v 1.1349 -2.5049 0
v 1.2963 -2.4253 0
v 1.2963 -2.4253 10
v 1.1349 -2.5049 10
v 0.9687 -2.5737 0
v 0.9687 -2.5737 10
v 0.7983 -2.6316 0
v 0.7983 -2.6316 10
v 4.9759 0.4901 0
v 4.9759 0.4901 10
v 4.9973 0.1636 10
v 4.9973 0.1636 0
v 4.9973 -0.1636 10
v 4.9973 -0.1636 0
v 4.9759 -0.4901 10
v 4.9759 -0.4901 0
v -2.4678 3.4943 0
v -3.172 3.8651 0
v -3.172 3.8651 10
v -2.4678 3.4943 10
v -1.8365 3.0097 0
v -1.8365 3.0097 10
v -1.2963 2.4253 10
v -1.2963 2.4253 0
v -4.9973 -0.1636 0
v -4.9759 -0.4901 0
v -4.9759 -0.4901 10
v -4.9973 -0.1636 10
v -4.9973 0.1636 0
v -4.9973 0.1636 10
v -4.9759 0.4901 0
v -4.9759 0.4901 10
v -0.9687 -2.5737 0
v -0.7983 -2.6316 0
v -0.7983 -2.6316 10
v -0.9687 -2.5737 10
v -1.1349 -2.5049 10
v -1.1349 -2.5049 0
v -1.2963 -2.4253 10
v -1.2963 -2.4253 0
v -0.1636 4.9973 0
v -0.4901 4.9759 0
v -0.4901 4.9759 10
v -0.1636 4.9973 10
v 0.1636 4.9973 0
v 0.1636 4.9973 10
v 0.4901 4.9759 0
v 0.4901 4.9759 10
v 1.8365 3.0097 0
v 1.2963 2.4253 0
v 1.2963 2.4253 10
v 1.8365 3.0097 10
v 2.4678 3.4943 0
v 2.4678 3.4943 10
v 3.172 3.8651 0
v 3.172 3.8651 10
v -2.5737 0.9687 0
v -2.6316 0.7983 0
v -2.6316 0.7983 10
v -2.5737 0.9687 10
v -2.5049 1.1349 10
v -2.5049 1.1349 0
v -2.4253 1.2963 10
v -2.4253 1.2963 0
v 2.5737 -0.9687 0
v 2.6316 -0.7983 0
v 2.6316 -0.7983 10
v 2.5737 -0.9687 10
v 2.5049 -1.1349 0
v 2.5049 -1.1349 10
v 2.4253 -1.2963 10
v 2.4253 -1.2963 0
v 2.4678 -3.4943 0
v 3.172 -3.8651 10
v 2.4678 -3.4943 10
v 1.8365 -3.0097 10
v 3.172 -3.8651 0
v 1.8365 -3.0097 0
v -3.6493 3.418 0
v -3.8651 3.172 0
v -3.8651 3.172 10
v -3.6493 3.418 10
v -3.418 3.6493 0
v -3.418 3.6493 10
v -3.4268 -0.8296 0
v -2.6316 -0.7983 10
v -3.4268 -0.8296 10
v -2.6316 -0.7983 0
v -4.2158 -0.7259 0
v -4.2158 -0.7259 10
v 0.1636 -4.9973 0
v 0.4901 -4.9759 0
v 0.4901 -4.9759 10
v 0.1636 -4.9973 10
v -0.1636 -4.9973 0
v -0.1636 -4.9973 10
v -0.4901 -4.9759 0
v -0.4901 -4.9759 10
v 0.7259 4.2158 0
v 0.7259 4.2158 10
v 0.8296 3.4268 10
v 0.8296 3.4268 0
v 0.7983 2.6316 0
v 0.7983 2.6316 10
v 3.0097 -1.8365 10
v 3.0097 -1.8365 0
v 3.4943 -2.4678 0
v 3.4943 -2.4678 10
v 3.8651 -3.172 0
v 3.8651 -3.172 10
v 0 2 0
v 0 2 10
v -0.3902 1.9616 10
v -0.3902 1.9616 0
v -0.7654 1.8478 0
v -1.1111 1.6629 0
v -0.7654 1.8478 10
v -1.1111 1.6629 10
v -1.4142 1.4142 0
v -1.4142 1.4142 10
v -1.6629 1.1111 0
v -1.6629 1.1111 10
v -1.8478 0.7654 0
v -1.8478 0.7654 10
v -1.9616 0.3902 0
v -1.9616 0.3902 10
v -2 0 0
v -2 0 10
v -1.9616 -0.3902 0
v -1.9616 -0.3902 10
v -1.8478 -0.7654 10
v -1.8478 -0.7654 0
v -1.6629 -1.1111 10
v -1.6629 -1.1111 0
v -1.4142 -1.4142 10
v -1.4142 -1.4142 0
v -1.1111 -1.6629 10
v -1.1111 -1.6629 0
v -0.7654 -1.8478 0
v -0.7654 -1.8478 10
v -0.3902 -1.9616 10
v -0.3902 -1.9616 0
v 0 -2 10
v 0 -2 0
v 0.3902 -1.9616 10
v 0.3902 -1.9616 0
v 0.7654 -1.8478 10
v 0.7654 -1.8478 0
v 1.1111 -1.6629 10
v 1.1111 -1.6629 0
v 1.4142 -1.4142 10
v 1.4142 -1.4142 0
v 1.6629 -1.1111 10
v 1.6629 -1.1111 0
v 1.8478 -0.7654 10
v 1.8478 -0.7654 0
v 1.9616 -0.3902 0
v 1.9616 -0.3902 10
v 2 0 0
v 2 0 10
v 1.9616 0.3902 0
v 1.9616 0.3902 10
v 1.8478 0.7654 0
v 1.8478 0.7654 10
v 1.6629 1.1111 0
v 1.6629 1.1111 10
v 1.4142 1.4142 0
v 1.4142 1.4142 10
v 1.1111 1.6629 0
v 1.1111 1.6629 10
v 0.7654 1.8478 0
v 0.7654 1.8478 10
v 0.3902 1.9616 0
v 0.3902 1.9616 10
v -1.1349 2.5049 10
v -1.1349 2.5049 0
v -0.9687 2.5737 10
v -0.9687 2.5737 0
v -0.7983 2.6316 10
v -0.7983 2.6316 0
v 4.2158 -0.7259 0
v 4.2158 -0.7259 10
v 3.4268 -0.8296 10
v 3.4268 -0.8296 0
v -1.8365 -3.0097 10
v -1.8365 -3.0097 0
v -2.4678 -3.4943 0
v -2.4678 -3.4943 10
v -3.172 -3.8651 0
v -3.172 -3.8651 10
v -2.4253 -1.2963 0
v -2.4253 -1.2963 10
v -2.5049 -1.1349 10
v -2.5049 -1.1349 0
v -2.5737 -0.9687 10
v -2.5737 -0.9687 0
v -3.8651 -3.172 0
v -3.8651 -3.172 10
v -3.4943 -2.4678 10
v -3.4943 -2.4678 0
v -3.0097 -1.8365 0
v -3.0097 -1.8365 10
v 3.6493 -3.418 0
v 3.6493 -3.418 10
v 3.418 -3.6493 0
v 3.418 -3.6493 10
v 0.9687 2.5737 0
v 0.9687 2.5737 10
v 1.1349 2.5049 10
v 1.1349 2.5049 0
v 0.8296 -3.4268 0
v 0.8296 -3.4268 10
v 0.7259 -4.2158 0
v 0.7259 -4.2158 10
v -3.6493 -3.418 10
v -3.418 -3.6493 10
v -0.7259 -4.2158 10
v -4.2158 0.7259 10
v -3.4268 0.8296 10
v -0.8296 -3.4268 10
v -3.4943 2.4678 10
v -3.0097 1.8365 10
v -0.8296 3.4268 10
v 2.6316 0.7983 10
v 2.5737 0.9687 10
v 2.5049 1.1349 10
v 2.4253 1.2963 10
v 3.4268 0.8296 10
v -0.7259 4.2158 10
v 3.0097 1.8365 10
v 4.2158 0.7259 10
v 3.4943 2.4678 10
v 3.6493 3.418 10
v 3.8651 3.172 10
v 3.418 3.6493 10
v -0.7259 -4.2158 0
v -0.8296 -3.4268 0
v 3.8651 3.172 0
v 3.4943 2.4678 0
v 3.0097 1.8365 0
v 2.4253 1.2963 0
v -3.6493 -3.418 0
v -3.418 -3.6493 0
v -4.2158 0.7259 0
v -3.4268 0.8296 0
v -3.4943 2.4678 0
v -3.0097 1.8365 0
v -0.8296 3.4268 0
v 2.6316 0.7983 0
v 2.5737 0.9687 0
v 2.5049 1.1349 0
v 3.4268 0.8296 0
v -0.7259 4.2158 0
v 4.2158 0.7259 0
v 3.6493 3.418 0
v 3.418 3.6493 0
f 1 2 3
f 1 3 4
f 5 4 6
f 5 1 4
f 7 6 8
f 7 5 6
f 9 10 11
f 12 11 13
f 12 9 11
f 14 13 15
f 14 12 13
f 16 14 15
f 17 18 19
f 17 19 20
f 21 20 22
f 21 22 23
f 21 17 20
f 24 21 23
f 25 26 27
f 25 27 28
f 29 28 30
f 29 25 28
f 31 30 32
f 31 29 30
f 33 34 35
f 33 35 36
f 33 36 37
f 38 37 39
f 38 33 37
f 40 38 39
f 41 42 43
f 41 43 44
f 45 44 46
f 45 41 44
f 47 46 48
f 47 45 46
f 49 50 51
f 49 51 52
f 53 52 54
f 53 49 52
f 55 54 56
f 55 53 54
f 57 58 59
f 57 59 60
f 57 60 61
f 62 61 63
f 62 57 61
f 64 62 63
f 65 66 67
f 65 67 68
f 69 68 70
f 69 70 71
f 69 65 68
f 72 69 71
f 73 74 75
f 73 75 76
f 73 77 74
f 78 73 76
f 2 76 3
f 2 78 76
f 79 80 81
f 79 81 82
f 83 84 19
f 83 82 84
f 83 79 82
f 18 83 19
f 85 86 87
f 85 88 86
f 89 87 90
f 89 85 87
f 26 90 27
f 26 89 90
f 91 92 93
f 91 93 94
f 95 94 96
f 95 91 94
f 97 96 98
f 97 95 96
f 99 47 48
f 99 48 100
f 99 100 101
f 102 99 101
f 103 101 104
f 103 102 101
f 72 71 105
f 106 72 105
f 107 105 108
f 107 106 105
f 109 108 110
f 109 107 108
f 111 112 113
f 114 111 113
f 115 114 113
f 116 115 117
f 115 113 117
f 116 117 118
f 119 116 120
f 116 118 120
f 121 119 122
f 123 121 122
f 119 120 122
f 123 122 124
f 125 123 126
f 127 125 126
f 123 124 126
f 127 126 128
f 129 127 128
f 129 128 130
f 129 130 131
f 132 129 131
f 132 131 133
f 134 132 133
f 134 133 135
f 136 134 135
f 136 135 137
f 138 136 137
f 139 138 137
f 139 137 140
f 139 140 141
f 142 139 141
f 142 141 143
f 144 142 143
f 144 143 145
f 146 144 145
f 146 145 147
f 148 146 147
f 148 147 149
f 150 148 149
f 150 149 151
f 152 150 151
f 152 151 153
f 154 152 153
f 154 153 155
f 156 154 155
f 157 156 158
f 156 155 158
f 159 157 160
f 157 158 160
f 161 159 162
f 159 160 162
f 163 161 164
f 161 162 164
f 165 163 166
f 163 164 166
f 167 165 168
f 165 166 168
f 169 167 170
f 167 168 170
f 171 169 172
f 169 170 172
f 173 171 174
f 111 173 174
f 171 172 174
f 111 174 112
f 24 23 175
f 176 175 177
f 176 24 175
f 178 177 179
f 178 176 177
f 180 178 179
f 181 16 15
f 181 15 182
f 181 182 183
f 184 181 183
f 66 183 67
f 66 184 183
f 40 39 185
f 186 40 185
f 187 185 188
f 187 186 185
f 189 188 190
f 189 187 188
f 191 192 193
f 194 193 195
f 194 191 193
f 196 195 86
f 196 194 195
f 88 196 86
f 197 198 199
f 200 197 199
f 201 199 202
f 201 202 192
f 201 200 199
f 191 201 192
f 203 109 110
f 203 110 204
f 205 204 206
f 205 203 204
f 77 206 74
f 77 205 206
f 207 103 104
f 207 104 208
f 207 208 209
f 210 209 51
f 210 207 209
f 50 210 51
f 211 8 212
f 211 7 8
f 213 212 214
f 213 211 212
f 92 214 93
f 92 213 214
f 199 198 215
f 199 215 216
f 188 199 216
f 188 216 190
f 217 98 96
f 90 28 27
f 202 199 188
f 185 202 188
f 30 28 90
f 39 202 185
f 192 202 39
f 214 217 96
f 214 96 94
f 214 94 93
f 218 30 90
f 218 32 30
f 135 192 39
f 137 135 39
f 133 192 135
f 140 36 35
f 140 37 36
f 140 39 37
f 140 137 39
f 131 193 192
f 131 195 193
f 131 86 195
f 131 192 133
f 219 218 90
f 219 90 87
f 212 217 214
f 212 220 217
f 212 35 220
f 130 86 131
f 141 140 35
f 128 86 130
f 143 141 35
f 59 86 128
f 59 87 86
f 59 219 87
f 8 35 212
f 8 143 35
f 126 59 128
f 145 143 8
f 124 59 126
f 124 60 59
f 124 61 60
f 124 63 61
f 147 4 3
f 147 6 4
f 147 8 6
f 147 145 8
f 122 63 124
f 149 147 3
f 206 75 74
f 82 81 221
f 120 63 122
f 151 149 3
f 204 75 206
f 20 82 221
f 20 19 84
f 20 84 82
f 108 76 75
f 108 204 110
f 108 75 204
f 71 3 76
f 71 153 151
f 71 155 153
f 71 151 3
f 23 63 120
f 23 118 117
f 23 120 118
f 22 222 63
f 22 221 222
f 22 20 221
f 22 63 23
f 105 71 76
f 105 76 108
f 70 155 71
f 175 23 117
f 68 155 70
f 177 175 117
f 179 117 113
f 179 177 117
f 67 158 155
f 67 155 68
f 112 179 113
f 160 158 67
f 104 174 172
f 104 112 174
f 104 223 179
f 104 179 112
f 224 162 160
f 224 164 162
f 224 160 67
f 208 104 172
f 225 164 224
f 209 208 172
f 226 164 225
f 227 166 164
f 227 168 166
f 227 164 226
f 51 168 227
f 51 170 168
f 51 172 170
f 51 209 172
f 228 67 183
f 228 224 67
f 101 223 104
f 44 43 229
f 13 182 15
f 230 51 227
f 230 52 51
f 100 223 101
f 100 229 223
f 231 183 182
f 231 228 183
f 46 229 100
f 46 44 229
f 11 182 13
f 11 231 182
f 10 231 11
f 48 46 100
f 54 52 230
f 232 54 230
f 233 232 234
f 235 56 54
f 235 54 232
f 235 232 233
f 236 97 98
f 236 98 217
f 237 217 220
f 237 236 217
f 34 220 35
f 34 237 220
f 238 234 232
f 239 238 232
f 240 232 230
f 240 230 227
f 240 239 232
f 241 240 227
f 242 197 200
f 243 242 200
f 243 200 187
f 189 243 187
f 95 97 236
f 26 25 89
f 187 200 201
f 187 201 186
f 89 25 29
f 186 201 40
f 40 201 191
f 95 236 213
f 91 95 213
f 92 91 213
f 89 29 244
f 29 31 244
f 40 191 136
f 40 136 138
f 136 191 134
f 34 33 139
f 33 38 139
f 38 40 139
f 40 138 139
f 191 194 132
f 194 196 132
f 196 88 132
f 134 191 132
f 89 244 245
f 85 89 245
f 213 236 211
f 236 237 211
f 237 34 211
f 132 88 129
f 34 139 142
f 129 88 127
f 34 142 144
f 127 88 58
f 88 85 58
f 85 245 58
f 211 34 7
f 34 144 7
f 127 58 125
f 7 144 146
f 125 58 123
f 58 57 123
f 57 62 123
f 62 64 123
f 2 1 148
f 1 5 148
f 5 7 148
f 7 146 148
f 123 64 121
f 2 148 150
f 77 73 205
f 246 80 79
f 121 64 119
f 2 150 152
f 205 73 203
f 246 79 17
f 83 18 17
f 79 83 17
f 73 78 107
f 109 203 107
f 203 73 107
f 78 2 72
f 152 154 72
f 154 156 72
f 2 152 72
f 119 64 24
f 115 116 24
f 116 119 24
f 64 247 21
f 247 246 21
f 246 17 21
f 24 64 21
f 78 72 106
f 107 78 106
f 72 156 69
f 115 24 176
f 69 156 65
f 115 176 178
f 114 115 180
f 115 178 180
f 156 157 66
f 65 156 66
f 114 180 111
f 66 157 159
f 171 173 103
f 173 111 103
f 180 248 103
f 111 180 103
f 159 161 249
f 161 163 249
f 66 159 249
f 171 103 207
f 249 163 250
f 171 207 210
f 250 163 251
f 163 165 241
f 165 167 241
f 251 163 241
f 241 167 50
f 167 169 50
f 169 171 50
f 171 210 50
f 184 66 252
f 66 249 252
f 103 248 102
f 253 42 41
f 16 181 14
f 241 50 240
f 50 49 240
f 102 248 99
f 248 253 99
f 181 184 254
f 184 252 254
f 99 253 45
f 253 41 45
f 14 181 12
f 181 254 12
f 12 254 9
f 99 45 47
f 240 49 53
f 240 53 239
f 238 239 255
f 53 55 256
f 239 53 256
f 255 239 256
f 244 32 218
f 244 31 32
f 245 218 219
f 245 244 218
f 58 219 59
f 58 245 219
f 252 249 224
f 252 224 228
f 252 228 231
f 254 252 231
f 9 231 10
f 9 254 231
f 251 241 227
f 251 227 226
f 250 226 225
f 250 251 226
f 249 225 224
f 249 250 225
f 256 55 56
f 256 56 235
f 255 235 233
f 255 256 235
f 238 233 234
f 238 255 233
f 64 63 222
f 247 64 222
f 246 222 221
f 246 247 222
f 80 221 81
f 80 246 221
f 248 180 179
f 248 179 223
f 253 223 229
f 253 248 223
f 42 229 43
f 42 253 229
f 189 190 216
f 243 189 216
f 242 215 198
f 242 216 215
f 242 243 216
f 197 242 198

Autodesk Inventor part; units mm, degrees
sketch "Sketch1" plane through (0, 0, 0) normal (0, 0, 1) x (1, 0, 0)
  circle A0 centre (0, 0) radius 5
  dimension "d0" = 10
extrude "Extrusion1" add sketch "Sketch1" along normal blind 10
ref_plane "Work Plane2" through (0, 0, 5) normal (0, 0, 1) x (1, 0, 0)
sketch "Sketch2" plane through (0, 0, 0) normal (0, 0, -1) x (-1, 0, 0)
  circle A0 centre (0, 0) radius 5 projected
  circle A1 centre (0, 0) radius 4
  dimension "d3" = 8
surface extrude "Pitch Diameter" sketch "Sketch2" against normal through all shown no curves A1
ref_plane "Work Plane8" through (0, 0, 0) normal (0.9238795, 0.3826834, 0) x (0, 0, 1)
ref_plane "Work Plane9" through (0, 0, 0) normal (1, 0, 0) x (0, 1, 0)
spur gear teeth "Spur Gear" teeth 8 pitch diameter 8 tip diameter 10 root diameter 5.5 face width 10 start plane through (0, 0, 0) normal (0, 0, -1) x (-1, 0, 0)
sketch "Sketch3" plane through (0, 0, 0) normal (0, 0, -1) x (-1, 0, 0)
  point P0 (0, 0)
  point P1 (0, 0)
hole "Hole1" at (0, 0, 0) direction (0, 0, 1) diameter 4 end through all
equation "\"d0\" = da_da"
equation "\"d1\" = da_b"
equation "\"d3\" = da_d"
equation "\"d16\" = da_aw"
equation "\"d43\" = da_aw"
equation "\"d46\" = da_aw"
equation "\"da_da\" = 10"
equation "\"da_b\" = 10"
equation "\"da_d\" = 8"
equation "\"da_aw\" = 19"
properties part number "Spur Gear1" material "Steel"
